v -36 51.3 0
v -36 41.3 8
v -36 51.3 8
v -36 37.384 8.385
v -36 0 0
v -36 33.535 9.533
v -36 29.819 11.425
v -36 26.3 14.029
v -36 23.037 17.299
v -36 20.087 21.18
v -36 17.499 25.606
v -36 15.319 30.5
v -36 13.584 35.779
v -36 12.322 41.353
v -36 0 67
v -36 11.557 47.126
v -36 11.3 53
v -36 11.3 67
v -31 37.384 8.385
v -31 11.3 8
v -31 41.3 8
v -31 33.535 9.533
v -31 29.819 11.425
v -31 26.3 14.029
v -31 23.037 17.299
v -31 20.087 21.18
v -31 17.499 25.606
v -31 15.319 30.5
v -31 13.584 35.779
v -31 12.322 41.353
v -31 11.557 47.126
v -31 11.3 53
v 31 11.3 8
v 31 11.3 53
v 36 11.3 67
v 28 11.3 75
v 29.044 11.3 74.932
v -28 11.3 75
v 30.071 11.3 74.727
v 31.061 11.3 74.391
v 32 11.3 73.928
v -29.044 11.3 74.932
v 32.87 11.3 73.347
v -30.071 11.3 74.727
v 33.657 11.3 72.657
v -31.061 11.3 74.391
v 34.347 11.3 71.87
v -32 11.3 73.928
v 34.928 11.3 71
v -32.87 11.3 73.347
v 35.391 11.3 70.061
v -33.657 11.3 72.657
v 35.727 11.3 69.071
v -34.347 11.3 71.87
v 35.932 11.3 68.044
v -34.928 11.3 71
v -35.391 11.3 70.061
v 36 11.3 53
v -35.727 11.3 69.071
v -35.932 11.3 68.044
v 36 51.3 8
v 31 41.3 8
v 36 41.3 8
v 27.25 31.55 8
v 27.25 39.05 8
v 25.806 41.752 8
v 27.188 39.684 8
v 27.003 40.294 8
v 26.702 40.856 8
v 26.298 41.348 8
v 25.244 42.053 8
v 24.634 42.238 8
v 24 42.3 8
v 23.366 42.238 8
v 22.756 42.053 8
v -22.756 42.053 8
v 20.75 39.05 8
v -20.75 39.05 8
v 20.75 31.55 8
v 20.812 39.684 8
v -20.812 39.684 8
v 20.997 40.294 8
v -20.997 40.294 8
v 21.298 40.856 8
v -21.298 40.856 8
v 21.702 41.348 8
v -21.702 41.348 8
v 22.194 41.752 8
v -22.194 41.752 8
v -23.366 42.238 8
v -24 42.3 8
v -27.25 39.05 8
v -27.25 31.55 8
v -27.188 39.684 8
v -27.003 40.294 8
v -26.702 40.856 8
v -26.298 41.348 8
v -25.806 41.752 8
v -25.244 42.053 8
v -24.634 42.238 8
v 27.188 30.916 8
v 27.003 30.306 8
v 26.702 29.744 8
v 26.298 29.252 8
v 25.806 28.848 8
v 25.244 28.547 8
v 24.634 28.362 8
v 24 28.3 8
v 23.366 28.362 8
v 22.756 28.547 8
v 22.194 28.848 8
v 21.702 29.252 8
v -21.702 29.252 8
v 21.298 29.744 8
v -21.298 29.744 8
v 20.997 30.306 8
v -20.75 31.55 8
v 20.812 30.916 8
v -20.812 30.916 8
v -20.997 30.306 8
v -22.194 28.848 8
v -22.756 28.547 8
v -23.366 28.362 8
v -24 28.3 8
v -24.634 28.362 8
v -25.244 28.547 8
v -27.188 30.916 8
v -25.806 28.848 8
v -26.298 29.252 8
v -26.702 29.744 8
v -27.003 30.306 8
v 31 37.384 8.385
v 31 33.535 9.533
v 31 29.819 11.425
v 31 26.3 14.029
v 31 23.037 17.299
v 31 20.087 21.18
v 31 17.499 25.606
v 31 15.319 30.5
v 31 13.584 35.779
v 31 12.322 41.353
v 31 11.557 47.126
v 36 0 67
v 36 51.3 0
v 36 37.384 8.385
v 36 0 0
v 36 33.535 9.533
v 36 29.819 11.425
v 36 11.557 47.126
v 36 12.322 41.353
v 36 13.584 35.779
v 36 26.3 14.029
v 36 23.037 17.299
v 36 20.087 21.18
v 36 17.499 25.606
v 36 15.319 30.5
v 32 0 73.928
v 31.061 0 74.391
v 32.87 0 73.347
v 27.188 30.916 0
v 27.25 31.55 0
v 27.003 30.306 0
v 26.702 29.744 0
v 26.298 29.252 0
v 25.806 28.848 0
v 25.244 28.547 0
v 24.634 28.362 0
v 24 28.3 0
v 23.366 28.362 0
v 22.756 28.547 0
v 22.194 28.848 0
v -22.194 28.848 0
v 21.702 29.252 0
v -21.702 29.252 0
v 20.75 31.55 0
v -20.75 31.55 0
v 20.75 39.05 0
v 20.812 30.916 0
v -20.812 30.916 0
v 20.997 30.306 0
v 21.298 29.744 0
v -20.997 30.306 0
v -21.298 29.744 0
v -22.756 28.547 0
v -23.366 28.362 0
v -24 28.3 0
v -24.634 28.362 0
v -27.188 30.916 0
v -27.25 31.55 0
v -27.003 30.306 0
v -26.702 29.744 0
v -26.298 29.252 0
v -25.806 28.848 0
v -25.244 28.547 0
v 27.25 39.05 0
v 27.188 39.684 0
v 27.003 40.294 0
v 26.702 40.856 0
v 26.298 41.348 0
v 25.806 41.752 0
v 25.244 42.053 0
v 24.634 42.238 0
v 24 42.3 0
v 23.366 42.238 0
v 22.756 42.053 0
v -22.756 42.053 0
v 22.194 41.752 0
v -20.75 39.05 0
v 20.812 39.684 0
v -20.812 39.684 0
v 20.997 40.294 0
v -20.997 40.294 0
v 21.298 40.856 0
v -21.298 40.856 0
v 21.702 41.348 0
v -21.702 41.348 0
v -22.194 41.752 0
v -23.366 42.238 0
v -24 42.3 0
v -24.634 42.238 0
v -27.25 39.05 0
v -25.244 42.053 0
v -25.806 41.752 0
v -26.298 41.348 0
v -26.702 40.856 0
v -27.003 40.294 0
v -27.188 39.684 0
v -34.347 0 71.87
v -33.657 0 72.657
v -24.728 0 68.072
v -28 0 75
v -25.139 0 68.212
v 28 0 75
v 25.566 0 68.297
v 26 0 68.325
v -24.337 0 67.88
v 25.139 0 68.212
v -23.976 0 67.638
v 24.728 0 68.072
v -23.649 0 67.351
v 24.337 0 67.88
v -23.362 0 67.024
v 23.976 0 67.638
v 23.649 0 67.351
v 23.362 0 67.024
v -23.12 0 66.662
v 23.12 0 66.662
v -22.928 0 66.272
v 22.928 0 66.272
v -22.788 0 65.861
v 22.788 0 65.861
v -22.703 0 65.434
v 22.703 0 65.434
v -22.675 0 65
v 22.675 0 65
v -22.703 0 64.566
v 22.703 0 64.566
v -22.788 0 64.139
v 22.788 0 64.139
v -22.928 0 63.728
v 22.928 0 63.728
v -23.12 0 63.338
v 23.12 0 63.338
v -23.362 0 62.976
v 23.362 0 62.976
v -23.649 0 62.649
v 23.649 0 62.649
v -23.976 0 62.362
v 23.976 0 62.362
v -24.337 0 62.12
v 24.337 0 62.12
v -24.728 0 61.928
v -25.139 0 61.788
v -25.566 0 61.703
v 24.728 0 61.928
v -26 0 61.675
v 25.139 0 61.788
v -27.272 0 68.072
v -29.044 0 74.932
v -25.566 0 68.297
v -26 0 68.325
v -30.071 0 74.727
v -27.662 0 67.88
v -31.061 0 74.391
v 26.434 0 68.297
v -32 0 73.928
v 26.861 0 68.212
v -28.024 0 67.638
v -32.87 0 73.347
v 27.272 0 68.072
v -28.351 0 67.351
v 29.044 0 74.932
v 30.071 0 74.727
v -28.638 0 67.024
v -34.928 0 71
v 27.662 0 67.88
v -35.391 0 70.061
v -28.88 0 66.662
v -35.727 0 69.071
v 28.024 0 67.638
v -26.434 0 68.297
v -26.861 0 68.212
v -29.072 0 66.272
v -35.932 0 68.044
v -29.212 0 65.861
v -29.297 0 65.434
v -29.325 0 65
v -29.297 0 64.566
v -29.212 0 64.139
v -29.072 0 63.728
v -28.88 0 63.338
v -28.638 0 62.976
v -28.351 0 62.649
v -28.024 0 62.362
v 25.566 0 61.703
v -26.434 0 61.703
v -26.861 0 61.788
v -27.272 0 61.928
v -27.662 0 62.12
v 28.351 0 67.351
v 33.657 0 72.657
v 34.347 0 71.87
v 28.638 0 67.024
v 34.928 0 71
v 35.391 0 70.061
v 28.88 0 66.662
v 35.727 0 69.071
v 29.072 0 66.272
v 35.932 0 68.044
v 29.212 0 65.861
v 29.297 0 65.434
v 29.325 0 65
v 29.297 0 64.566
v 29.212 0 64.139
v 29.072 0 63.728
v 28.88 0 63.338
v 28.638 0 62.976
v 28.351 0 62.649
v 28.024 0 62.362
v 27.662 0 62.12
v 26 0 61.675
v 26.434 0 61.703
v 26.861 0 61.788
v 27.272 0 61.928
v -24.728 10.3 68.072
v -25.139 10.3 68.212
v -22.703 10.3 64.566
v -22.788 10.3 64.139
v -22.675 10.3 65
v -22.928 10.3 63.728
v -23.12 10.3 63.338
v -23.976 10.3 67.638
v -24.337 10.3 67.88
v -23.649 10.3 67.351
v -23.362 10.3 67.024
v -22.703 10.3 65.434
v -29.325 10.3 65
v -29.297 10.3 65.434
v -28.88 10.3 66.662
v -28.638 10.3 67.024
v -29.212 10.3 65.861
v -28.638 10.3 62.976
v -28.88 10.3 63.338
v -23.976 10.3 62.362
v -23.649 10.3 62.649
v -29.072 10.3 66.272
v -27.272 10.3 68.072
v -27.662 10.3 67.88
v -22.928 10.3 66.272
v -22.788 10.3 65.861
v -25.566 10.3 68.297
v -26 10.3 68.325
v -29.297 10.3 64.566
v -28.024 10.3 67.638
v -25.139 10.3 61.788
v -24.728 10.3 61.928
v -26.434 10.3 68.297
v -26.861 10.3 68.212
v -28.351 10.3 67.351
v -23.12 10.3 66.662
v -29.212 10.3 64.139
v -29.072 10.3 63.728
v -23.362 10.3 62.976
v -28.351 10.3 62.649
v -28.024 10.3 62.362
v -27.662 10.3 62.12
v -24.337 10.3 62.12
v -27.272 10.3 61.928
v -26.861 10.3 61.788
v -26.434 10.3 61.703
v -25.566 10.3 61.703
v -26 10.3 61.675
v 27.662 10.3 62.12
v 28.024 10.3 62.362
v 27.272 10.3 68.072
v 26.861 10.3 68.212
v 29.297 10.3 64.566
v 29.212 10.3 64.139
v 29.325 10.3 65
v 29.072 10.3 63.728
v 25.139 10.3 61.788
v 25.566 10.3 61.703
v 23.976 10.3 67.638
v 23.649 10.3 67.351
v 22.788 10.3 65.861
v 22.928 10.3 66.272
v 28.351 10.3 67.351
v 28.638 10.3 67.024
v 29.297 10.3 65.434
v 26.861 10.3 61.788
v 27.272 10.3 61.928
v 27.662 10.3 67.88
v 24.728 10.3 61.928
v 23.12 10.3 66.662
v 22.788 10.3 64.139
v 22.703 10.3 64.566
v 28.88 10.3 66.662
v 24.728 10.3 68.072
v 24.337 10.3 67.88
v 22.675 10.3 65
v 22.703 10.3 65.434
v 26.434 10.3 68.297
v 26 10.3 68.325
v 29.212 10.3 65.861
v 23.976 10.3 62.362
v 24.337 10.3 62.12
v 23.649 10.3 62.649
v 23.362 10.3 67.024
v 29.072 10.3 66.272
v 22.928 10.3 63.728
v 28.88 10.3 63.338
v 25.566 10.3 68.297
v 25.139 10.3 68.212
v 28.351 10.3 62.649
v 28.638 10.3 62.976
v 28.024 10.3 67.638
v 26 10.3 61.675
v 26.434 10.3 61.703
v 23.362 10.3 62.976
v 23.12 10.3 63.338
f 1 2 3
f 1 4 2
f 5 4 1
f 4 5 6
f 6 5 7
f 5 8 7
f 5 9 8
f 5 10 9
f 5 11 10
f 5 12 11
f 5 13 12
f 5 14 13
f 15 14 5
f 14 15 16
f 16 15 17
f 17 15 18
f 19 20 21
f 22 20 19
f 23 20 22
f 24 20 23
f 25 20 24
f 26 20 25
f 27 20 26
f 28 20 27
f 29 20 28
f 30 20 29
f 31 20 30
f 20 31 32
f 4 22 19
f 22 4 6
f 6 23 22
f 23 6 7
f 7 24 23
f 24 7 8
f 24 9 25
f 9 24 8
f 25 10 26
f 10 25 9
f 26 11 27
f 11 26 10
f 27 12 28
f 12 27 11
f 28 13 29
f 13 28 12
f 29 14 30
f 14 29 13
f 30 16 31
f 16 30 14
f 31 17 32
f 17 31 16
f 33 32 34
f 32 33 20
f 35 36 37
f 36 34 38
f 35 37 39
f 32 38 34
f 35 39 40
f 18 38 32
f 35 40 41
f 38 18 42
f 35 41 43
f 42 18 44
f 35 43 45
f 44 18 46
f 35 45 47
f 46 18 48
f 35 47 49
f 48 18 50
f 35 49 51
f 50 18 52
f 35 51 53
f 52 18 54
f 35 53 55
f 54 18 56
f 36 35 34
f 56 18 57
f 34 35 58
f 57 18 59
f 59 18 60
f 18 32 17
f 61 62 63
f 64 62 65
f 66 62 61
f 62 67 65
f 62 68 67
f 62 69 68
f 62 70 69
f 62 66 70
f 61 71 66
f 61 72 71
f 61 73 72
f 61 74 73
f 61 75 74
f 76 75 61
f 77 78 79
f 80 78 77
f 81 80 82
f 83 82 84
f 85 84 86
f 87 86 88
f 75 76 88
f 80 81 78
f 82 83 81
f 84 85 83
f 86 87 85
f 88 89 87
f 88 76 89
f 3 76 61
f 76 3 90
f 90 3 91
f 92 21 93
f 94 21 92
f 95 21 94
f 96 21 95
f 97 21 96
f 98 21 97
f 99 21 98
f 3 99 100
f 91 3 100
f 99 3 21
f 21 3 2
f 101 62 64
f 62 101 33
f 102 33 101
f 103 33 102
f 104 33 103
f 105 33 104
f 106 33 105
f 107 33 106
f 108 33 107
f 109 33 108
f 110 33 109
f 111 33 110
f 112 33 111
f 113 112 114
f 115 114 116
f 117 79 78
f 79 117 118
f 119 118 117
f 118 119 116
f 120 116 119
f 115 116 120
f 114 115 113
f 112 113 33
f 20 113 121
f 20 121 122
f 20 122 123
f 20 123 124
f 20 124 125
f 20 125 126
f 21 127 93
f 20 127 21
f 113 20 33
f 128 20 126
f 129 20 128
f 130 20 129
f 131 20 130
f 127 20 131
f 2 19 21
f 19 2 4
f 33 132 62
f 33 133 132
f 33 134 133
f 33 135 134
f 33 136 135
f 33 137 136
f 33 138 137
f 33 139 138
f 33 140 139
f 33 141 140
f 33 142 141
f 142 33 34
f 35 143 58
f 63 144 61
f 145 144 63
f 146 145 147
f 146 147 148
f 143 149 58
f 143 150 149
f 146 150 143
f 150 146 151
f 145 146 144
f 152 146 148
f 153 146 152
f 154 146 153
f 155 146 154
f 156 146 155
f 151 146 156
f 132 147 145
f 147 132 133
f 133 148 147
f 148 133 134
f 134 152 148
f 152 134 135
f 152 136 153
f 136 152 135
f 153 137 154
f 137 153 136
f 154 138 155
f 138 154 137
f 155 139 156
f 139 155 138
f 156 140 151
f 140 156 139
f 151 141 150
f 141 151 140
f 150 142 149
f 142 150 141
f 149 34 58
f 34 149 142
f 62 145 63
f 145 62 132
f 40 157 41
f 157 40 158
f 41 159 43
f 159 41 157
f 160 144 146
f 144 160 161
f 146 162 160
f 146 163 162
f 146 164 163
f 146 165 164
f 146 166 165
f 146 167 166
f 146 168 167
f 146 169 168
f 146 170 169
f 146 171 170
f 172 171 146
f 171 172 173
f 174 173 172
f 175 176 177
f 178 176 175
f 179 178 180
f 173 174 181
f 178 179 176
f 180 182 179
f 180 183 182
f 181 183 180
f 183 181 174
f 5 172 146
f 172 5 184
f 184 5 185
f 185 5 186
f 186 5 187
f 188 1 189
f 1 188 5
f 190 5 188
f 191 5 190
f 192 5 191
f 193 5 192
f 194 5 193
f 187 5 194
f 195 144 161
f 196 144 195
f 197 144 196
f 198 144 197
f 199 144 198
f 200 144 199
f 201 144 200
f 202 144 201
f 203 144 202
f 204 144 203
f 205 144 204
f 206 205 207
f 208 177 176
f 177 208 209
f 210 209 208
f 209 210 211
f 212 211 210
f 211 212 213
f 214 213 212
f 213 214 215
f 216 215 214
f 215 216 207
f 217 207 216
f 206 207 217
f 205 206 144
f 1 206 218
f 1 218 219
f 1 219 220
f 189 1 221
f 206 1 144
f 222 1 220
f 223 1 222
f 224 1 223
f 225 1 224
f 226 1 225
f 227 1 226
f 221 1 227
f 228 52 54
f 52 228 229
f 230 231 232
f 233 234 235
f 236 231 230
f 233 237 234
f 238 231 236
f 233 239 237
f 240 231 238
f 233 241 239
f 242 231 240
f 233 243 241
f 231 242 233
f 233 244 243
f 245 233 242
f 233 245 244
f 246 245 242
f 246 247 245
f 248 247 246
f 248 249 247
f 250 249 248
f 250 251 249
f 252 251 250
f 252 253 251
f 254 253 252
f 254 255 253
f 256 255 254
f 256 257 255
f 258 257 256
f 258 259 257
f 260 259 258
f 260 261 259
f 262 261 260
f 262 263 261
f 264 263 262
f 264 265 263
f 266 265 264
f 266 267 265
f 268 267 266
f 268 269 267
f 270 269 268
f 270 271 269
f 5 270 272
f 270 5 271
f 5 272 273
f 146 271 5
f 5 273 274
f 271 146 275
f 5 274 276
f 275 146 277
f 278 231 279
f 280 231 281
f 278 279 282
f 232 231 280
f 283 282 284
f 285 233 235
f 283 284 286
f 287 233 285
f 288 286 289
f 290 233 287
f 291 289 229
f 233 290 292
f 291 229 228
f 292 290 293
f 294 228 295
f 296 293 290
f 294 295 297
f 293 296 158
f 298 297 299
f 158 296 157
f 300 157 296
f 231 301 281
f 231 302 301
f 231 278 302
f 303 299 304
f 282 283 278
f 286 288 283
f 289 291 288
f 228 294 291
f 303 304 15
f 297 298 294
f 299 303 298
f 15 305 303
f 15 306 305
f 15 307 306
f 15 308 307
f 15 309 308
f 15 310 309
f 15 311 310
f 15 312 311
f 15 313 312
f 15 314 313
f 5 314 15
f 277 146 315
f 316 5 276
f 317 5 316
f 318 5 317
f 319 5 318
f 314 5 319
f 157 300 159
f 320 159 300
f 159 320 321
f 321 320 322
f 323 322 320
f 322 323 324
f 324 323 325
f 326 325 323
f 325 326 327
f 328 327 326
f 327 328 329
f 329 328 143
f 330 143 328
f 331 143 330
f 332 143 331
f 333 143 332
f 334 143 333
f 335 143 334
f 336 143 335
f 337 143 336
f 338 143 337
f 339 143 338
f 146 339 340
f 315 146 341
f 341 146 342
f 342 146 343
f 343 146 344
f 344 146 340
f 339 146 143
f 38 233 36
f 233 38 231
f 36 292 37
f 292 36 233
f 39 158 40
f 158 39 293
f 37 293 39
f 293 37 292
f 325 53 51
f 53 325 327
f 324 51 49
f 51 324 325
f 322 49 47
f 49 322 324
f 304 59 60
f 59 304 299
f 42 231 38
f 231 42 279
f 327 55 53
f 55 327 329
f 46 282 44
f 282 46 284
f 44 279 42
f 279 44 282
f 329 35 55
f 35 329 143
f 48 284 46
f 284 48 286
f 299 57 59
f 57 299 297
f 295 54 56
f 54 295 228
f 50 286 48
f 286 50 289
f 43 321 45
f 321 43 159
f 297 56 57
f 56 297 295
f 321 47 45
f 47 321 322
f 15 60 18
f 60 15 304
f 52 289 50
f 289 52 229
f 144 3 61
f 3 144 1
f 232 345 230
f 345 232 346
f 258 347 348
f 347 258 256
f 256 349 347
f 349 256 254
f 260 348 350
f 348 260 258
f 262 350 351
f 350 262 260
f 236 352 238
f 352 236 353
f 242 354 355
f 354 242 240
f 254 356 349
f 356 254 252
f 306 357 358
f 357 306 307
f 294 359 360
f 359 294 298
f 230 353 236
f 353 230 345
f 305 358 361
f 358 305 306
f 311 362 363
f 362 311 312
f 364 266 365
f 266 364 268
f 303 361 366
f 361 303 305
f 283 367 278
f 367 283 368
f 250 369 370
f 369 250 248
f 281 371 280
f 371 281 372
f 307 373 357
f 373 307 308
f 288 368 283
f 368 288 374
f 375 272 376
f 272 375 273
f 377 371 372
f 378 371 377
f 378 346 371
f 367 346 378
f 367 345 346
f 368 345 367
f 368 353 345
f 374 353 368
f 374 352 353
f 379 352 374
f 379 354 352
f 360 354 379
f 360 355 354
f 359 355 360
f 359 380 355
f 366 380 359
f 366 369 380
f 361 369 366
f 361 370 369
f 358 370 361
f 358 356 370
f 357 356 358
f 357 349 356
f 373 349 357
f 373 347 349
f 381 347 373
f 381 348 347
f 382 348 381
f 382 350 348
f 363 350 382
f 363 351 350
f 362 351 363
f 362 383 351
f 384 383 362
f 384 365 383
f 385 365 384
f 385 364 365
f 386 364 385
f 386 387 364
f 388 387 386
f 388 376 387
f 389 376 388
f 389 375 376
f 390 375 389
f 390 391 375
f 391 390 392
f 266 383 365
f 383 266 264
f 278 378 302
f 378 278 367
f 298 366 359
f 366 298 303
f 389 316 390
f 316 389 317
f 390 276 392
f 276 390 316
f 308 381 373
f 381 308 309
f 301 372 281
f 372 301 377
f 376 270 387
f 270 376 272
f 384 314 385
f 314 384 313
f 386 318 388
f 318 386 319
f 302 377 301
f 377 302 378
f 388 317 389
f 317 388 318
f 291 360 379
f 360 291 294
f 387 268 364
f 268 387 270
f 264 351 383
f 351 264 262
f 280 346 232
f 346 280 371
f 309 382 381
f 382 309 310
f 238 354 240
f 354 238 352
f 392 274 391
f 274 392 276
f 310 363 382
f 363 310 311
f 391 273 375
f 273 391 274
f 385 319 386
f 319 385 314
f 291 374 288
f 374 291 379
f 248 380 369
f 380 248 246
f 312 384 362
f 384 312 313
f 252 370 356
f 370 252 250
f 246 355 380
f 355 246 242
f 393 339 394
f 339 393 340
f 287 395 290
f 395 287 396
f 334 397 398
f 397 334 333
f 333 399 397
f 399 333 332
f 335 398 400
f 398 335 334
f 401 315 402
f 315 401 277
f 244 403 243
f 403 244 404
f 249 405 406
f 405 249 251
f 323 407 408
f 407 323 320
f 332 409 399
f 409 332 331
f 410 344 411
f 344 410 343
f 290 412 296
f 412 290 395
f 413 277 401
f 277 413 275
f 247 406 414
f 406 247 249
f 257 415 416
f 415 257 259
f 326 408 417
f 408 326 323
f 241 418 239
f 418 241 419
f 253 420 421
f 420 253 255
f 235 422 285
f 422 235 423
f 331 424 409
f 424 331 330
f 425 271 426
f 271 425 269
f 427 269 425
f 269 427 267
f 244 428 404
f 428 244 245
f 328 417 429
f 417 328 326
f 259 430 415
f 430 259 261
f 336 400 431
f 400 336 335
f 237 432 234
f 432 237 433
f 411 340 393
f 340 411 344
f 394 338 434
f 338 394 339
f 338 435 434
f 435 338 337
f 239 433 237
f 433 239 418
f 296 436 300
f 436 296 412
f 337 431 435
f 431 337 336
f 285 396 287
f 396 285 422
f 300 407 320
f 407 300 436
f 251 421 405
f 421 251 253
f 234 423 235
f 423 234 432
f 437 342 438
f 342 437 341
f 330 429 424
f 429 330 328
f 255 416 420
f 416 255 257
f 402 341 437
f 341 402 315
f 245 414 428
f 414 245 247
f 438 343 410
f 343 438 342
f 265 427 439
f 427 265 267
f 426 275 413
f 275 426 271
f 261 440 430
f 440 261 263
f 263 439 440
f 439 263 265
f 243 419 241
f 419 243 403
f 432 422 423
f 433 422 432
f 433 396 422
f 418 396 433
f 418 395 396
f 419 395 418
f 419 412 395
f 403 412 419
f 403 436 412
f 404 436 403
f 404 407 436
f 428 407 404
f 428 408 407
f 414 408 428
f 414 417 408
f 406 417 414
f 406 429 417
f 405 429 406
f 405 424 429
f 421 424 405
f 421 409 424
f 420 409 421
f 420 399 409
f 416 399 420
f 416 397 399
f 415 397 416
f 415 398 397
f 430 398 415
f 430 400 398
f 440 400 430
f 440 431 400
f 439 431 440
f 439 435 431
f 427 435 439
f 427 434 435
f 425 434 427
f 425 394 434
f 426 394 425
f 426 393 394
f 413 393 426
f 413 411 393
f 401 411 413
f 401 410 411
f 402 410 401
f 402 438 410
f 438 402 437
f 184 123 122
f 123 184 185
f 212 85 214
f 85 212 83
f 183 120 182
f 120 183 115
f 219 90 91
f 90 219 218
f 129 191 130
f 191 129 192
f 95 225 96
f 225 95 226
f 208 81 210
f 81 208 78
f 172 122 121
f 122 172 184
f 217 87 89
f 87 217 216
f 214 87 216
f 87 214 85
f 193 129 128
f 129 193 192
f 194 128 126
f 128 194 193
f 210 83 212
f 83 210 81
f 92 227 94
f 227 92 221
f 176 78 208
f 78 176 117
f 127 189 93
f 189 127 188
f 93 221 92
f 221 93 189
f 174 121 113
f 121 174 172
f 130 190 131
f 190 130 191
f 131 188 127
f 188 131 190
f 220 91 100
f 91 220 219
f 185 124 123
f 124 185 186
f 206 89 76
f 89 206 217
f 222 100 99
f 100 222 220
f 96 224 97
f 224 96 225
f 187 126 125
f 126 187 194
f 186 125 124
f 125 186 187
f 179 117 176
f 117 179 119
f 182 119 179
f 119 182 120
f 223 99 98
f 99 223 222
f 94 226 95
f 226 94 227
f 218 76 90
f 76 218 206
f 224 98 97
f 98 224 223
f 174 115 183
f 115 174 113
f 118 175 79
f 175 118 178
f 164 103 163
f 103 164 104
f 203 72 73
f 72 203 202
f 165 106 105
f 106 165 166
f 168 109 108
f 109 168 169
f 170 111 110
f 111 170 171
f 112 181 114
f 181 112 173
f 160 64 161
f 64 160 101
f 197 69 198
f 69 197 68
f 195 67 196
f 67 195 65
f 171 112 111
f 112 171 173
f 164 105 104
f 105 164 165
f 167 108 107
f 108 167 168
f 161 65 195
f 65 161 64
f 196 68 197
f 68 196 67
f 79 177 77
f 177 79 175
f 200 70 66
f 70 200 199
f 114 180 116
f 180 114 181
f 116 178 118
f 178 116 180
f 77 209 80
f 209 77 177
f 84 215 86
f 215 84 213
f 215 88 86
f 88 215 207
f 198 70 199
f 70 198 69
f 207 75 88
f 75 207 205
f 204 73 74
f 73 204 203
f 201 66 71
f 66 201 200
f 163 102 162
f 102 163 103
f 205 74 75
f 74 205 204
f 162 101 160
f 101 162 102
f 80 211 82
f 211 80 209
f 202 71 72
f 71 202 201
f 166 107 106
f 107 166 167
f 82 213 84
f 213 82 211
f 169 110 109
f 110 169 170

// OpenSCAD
// =============================================================================
// FPR Carrier — Aeromotive A1000 Gen II (13138/13139) w/ STOCK STEEL BRACKET
// =============================================================================
// The regulator keeps its factory stamped-steel bracket (10-24s into the lower
// block, joggle, two ears). The ears bolt to this printed carrier pad via M5
// screws into heat-set inserts (validated 6.65mm bore workflow from the battery
// tray). The carrier's base flange (M6 slots) is the interface to the future
// chassis-mount assembly shared with the flex fuel sensor bracket.
//
// All regulator dimensions below are CALIPER-MEASURED on the actual unit
// (2026-07-25) unless marked [approx].
//
// Frame: mating face (ears press here) at Y=0; regulator forward of it (-Y);
// flange extends rearward (+Y). X centered. Z=0 at flange bottom.
// =============================================================================

// ---- MEASURED: STEEL BRACKET EAR PATTERN ----
ear_spacing        = 52.0;   // hole center-to-center (46.5 inside-inside + 5.5 dia)
ear_hole_d         = 5.5;    // ear hole diameter — M5 passes with 0.5mm slop
ear_center_above_base = 47.0; // ear-hole centerline above FPR bottom face
ear_top_above_base = 53.0;   // bracket top edge above FPR bottom face
bracket_steel_t    = 2.0;    // [approx] stamped steel thickness (ghost only)

// ---- MEASURED: REGULATOR ENVELOPE ----
axis_from_plane    = 27.0;   // body centerline forward of the ear mating plane
                             // (8.6 gap to thin can + 36.86/2; cross-checks with thick can)
can_dia_main       = 41.25;  // thick can diameter
can_dia_top        = 36.86;  // thin top section diameter
can_top_h          = 18.8;   // height of the thin top section
can_top_above_base = 72.25;  // FPR bottom face -> top of can
adjuster_extra_h   = 15.0;   // stud + jam nut above can top (total 87.25)
block_w            = 51.0;   // lower block width across the side-port faces
block_d            = 51.0;   // [approx] lower block depth fore-aft (gauge-port face to rear)
block_h            = 34.0;   // MEASURED: lower block height above FPR bottom; can starts here
port_axis_above_base = 13.0; // MEASURED: side ORB port centers above FPR bottom (gauge port assumed same)

// ---- FITTINGS (keep-out; [approx] — update to your actual hose ends) ----
side_fitting_dia   = 27;     // ORB-08 -> AN-8 adapter + hose-end wrench hex OD
side_fitting_len   = 40;     // stick-out per side incl. hose-end socket
return_fitting_dia = 22;     // ORB-06 -> AN-6 on the bottom return port
return_fitting_len = 45;     // drop below the FPR bottom face
gauge_stub_dia     = 16;     // 1/8" NPT gauge fitting on the FRONT face
gauge_stub_len     = 18;
vac_nipple_dia     = 8;      // vacuum/boost nipple, RIGHT side above the ORB port
vac_nipple_len     = 25;
vac_above_base     = 43.0;   // MEASURED: nipple center above FPR bottom (30mm above ORB center)

// ---- M5 HEAT-SET INSERTS (validated: fuse-insert-dia-test-3, battery tray) ----
insert_length      = 10.0;   // M5x10 insert
insert_pilot_dia   = 6.65;   // uniform melt-bore — seats clean/flush in ASA
insert_seat_clearance = 0.3; // extra depth so the insert sits flush
insert_pocket_floor   = 1.0; // material left behind the insert tip

// ---- CARRIER PAD ----
pad_t              = insert_length + insert_seat_clearance + insert_pocket_floor; // 11.3 validated slab
pad_w              = 72;     // spans the ears (52 c-c + margin around each hole)
pad_corner_r       = 8;      // top corner rounding
pad_top_margin     = 10;     // pad extends this far above the insert centers
fpr_base_above_flange = 10;  // FPR bottom face height above the flange TOP surface
                             // (raise to gain return-fitting ground clearance)

// ---- BASE FLANGE (interface to the future chassis assembly) ----
flange_depth       = 40;     // rearward extent (+Y)
flange_t           = 8;
flange_slot_w      = 6.5;    // M6 clearance slots
flange_slot_len    = 14;
flange_slot_spacing = 48;
flange_slot_y      = 24;     // slot centers rearward of the pad's back face
gusset_base        = 30;     // rearward reach along the flange
gusset_height      = 45;     // upward reach on the pad's back face
gusset_thickness   = 5;
gusset_shape       = "CURVED";
gusset_curve_segments = 48;

// ---- PREVIEW ----
show_ghost         = true;   // regulator + steel bracket keep-out (%-modifier, never exported)

// ---- DERIVED ----
insert_z  = flange_t + fpr_base_above_flange + ear_center_above_base; // insert/ear-hole centers
pad_h     = insert_z + pad_top_margin;                                // pad top (from Z=0)
fpr_base_z = flange_t + fpr_base_above_flange;                        // FPR bottom face height
hx        = ear_spacing / 2;

// =============================================================================
// MAIN ASSEMBLY
// =============================================================================
carrier();
if (show_ghost) %ghost_assembly();

module carrier() {
    difference() {
        union() {
            pad_body();
            base_flange();
            flange_gussets();
        }
        insert_bores();
        flange_slots();
    }
}

// =============================================================================
// CARRIER MODULES
// =============================================================================

module pad_body() {
    // Vertical slab, front face (mating plane) at Y=0, thickness rearward
    translate([0, pad_t, 0])
        rotate([90, 0, 0])
            linear_extrude(pad_t)
                rounded_top_rect_2d(pad_w, pad_h, pad_corner_r);
}

module rounded_top_rect_2d(w, h, r) {
    hull() {
        translate([-w/2, 0]) square([w, h - r]);
        translate([-w/2 + r, h - r]) circle(r=r, $fn=48);
        translate([ w/2 - r, h - r]) circle(r=r, $fn=48);
    }
}

module insert_bores() {
    // Horizontal 6.65mm melt-bores from the mating face (Y=0) rearward, one per
    // ear hole. Depth swallows the full insert + seat clearance, 1mm floor behind.
    depth = insert_length + insert_seat_clearance;
    for (sx = [-hx, hx])
        translate([sx, -1, insert_z])
            rotate([-90, 0, 0])
                cylinder(d=insert_pilot_dia, h=depth + 1, $fn=48);
}

module base_flange() {
    translate([-pad_w/2, pad_t, 0])
        cube([pad_w, flange_depth, flange_t]);
}

module flange_slots() {
    for (sx = [-flange_slot_spacing/2, flange_slot_spacing/2])
        translate([sx, pad_t + flange_slot_y, -1])
            slot_z(flange_slot_w, flange_slot_len, flange_t + 2);
}

module slot_z(w, len, h) {
    hull() {
        translate([0, -(len - w)/2, 0]) cylinder(d=w, h=h, $fn=32);
        translate([0,  (len - w)/2, 0]) cylinder(d=w, h=h, $fn=32);
    }
}

module flange_gussets() {
    // Curved gussets on the flange bracing the pad's back face, one per side edge.
    // rotate([90,0,90]): polygon +X -> world +Y, +Y -> world +Z, extrude -> +X.
    for (sx = [-pad_w/2, pad_w/2 - gusset_thickness])
        translate([sx, pad_t, flange_t])
            rotate([90, 0, 90])
                linear_extrude(gusset_thickness)
                    gusset_2d_shape(gusset_base, gusset_height);
}

module gusset_2d_shape(base, height) {
    if (gusset_shape == "STRAIGHT") {
        polygon([[0,0], [base, 0], [0, height]]);
    } else {
        difference() {
            polygon([[0,0], [base, 0], [base, height], [0, height]]);
            translate([base, height])
                scale([abs(base), height])
                    circle(r=1, $fn=gusset_curve_segments);
        }
    }
}

// =============================================================================
// GHOST (keep-out preview — regulator + steel bracket, measured dims)
// =============================================================================
module ghost_assembly() {
    bz = fpr_base_z;  // FPR bottom face
    translate([0, -axis_from_plane, 0]) {
        // lower ported block
        translate([-block_w/2, -block_d/2, bz])
            cube([block_w, block_d, block_h]);
        // main (thick) can
        translate([0, 0, bz + block_h])
            cylinder(d=can_dia_main, h=(can_top_above_base - can_top_h) - block_h, $fn=64);
        // thin top section
        translate([0, 0, bz + can_top_above_base - can_top_h])
            cylinder(d=can_dia_top, h=can_top_h, $fn=64);
        // adjuster stud + jam nut envelope
        translate([0, 0, bz + can_top_above_base])
            cylinder(d=14, h=adjuster_extra_h, $fn=32);
        // side port fittings (fuel inlets, left + right)
        for (sx = [-1, 1])
            translate([sx * block_w/2, 0, bz + port_axis_above_base])
                rotate([0, sx * 90, 0])
                    cylinder(d=side_fitting_dia, h=side_fitting_len, $fn=32);
        // bottom return fitting
        translate([0, 0, bz - return_fitting_len])
            cylinder(d=return_fitting_dia, h=return_fitting_len + 1, $fn=32);
        // gauge port stub (front face, -Y)
        translate([0, -block_d/2 - gauge_stub_len, bz + port_axis_above_base])
            rotate([-90, 0, 0])
                cylinder(d=gauge_stub_dia, h=gauge_stub_len + 1, $fn=32);
        // vacuum nipple (right side, above the right ORB port)
        translate([block_w/2, 0, bz + vac_above_base])
            rotate([0, 90, 0])
                cylinder(d=vac_nipple_dia, h=vac_nipple_len, $fn=24);
    }
    // steel bracket ear plate against the mating face
    ear_w = ear_spacing + 2 * 9;  // [approx] overall ear span
    translate([-ear_w/2, -bracket_steel_t, fpr_base_z + ear_center_above_base - 8])
        cube([ear_w, bracket_steel_t, (ear_top_above_base - ear_center_above_base) + 8]);
}
